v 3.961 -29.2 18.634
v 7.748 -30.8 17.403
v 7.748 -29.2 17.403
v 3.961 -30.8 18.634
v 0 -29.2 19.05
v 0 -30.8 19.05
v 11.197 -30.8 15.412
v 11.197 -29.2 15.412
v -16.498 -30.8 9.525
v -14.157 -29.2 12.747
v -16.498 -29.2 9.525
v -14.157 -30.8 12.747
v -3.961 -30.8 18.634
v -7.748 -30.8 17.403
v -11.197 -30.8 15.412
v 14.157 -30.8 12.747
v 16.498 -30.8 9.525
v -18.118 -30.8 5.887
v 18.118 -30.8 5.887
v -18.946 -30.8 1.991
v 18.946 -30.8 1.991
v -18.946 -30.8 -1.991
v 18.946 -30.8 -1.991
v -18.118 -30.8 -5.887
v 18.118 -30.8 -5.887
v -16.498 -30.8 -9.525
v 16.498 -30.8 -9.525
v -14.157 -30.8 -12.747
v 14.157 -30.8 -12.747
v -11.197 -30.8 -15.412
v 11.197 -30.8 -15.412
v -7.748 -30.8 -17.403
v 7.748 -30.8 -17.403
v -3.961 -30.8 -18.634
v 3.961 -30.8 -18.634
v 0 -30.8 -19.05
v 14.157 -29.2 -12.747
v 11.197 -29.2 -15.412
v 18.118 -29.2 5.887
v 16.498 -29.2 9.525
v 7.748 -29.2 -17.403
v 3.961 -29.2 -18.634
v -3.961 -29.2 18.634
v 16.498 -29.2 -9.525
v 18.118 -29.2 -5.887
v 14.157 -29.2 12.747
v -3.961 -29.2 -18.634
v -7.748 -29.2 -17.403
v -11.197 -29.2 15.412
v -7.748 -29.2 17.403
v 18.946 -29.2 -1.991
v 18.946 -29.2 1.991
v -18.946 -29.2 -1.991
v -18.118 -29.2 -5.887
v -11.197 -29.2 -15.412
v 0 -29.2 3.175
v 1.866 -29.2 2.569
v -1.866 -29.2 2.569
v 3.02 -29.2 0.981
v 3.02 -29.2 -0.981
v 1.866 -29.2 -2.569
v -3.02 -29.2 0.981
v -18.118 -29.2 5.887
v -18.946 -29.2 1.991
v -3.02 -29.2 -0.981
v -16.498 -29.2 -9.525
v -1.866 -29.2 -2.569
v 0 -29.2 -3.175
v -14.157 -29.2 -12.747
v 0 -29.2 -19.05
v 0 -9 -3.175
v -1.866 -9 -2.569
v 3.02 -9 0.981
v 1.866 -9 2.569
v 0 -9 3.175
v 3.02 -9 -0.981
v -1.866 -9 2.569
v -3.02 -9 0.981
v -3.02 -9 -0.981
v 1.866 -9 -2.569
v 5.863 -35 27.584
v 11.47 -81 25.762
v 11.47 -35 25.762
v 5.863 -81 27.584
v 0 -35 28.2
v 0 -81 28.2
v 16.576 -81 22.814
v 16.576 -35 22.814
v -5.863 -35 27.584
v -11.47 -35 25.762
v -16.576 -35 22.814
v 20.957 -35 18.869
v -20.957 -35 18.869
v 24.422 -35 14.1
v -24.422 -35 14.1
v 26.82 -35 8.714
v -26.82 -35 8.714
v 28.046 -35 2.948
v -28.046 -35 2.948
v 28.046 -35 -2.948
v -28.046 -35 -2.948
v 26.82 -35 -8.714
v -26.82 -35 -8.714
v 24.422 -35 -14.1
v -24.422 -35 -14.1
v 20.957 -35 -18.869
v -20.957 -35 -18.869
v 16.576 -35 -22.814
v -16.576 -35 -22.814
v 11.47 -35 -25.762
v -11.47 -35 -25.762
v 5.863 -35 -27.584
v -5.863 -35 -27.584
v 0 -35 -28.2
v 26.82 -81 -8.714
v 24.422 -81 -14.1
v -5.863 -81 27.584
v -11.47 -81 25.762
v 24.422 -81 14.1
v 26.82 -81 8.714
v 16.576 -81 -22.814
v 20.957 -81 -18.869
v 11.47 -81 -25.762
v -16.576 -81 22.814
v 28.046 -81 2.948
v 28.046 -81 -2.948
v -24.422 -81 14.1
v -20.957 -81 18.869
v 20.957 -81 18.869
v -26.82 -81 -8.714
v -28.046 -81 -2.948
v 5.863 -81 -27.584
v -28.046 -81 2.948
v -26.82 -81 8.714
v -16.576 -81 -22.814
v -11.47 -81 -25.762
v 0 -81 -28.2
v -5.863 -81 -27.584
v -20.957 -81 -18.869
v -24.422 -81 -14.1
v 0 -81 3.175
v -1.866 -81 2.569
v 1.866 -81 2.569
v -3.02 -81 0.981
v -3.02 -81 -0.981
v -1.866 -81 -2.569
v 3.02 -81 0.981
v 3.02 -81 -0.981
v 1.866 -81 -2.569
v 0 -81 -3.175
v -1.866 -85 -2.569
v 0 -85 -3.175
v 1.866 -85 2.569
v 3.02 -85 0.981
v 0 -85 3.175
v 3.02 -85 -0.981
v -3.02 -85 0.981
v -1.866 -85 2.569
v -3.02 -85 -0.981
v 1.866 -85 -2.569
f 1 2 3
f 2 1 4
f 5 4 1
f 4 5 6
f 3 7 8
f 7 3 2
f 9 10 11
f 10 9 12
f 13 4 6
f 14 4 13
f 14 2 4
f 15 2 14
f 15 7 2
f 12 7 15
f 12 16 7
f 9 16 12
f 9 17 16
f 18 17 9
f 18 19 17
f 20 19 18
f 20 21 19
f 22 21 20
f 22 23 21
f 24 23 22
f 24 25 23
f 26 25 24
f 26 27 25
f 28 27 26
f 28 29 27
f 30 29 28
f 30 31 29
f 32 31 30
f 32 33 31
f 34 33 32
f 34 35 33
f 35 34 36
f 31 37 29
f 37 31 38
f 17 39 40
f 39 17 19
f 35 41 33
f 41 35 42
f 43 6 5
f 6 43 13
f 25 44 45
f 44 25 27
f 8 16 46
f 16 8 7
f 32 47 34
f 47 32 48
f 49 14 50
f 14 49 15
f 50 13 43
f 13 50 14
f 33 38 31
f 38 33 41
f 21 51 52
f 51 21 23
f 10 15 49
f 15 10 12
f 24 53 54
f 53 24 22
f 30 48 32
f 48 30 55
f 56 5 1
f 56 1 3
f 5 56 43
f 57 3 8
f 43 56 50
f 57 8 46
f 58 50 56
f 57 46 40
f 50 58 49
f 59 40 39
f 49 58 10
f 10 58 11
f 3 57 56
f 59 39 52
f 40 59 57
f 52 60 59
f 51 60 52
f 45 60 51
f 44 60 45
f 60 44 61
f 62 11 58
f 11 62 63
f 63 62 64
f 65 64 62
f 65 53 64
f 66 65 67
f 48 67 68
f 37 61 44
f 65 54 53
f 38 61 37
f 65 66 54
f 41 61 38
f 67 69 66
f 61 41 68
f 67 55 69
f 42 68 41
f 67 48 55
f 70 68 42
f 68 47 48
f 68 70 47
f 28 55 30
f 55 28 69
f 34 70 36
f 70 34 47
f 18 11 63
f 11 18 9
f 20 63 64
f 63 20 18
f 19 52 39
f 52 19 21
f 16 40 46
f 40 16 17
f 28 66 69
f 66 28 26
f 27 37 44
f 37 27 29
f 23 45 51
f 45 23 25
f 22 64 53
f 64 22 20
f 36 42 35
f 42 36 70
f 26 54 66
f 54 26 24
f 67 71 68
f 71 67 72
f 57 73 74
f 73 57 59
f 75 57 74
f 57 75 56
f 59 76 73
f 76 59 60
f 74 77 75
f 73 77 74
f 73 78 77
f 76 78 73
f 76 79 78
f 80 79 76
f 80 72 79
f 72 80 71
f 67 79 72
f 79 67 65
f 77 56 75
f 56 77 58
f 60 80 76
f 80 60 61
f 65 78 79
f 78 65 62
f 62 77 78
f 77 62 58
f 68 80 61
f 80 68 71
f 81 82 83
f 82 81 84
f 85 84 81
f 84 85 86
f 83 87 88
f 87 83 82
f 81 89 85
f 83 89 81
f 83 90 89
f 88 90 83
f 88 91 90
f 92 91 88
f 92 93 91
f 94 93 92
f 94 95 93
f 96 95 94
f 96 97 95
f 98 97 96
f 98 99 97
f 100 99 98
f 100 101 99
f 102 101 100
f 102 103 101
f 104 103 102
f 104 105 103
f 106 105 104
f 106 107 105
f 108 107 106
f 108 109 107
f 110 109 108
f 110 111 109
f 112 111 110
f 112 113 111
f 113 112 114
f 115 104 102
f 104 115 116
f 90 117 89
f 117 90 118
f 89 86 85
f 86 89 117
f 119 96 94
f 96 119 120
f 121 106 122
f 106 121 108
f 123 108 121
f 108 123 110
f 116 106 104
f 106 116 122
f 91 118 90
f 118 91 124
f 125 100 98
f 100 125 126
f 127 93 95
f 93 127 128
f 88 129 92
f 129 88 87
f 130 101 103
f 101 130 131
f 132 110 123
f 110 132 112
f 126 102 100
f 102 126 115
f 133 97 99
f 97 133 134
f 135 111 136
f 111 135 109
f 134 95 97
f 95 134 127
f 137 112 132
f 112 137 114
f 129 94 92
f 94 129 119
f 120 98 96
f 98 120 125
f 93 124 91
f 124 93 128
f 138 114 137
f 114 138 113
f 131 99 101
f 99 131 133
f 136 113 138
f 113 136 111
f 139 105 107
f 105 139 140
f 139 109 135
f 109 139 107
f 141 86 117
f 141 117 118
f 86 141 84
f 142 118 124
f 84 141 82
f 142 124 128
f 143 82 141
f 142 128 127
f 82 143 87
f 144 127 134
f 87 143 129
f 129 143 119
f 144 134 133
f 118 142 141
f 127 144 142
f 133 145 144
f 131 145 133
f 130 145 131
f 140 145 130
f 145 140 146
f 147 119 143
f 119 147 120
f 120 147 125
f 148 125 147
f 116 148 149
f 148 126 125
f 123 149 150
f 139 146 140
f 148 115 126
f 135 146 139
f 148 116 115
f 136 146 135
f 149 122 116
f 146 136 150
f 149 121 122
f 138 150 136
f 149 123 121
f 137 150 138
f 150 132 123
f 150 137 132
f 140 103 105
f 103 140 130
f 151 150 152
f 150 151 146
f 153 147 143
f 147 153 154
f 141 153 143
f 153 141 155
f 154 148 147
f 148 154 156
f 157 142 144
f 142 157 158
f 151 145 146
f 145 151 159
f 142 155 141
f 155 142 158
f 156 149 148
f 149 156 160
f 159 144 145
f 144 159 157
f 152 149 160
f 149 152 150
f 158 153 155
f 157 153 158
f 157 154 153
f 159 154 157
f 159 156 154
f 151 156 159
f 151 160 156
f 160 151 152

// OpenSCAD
module aluminium_profile() {
	difference() {
		dxf_linear_extrude(file="dxf/aluminium_profile.dxf",layer="0",height=60,center=true,$fn=100);
		// stepper shaft hole
		rotate([90,0,0]) {
			translate([0,0,15]) {
				cylinder(r=19,h=31,center=true);
			}

			// nema23 mounting holes
			translate([23.57,23.57,15]) {
				cylinder(r=2.5,h=31,center=true);
			}
			translate([-23.57,23.57,15]) {
				cylinder(r=2.5,h=31,center=true);
			}
			translate([-23.57,-23.57,15]) {
				cylinder(r=2.5,h=31,center=true);
			}
			translate([23.57,-23.57,15]) {
				cylinder(r=2.5,h=31,center=true);
			}

			// leadscrew hole
			translate([0,0,-15]) {
				cylinder(r=8,h=31,center=true);
			}
			// dunnowhat holes
			translate([15,0,-15]) {
				cylinder(r=3,h=31,center=true);
			}
			translate([-15,0,-15]) {
				cylinder(r=3,h=31,center=true);
			}
		}
	}
}


module stepper() {
	translate([0,0,-2.5]) {
		difference() {
			dxf_linear_extrude(file="dxf/stepper.dxf",layer="0",height=5,center=true,$fn=100);
			// mounting holes
			translate([-23.57,23.57,0]) {
				cylinder(r=2.5,h=6,center=true);
			}
			translate([-23.57,-23.57,0]) {
				cylinder(r=2.5,h=6,center=true);
			}
			translate([23.57,-23.57,0]) {
				cylinder(r=2.5,h=6,center=true);
			}
		}
		// shaft
		translate([0,0,2.5]) {
			cylinder(r=19.05,h=1.6,center=true);
			cylinder(r=3.175,h=21,center=false);
		}
		// body
		translate([0,0,-48.5]) {
			cylinder(r=28.2,h=46,center=false);
			translate([0,0,-4]) {
				cylinder(r=3.175,h=4,center=false);
			}
		}
	}
}

module stepper_assembly() {
	aluminium_profile();
	translate([0,-30,0]) {
		rotate([-90,-90,0]) {
			stepper();
		}
	}
}


stepper_assembly();
